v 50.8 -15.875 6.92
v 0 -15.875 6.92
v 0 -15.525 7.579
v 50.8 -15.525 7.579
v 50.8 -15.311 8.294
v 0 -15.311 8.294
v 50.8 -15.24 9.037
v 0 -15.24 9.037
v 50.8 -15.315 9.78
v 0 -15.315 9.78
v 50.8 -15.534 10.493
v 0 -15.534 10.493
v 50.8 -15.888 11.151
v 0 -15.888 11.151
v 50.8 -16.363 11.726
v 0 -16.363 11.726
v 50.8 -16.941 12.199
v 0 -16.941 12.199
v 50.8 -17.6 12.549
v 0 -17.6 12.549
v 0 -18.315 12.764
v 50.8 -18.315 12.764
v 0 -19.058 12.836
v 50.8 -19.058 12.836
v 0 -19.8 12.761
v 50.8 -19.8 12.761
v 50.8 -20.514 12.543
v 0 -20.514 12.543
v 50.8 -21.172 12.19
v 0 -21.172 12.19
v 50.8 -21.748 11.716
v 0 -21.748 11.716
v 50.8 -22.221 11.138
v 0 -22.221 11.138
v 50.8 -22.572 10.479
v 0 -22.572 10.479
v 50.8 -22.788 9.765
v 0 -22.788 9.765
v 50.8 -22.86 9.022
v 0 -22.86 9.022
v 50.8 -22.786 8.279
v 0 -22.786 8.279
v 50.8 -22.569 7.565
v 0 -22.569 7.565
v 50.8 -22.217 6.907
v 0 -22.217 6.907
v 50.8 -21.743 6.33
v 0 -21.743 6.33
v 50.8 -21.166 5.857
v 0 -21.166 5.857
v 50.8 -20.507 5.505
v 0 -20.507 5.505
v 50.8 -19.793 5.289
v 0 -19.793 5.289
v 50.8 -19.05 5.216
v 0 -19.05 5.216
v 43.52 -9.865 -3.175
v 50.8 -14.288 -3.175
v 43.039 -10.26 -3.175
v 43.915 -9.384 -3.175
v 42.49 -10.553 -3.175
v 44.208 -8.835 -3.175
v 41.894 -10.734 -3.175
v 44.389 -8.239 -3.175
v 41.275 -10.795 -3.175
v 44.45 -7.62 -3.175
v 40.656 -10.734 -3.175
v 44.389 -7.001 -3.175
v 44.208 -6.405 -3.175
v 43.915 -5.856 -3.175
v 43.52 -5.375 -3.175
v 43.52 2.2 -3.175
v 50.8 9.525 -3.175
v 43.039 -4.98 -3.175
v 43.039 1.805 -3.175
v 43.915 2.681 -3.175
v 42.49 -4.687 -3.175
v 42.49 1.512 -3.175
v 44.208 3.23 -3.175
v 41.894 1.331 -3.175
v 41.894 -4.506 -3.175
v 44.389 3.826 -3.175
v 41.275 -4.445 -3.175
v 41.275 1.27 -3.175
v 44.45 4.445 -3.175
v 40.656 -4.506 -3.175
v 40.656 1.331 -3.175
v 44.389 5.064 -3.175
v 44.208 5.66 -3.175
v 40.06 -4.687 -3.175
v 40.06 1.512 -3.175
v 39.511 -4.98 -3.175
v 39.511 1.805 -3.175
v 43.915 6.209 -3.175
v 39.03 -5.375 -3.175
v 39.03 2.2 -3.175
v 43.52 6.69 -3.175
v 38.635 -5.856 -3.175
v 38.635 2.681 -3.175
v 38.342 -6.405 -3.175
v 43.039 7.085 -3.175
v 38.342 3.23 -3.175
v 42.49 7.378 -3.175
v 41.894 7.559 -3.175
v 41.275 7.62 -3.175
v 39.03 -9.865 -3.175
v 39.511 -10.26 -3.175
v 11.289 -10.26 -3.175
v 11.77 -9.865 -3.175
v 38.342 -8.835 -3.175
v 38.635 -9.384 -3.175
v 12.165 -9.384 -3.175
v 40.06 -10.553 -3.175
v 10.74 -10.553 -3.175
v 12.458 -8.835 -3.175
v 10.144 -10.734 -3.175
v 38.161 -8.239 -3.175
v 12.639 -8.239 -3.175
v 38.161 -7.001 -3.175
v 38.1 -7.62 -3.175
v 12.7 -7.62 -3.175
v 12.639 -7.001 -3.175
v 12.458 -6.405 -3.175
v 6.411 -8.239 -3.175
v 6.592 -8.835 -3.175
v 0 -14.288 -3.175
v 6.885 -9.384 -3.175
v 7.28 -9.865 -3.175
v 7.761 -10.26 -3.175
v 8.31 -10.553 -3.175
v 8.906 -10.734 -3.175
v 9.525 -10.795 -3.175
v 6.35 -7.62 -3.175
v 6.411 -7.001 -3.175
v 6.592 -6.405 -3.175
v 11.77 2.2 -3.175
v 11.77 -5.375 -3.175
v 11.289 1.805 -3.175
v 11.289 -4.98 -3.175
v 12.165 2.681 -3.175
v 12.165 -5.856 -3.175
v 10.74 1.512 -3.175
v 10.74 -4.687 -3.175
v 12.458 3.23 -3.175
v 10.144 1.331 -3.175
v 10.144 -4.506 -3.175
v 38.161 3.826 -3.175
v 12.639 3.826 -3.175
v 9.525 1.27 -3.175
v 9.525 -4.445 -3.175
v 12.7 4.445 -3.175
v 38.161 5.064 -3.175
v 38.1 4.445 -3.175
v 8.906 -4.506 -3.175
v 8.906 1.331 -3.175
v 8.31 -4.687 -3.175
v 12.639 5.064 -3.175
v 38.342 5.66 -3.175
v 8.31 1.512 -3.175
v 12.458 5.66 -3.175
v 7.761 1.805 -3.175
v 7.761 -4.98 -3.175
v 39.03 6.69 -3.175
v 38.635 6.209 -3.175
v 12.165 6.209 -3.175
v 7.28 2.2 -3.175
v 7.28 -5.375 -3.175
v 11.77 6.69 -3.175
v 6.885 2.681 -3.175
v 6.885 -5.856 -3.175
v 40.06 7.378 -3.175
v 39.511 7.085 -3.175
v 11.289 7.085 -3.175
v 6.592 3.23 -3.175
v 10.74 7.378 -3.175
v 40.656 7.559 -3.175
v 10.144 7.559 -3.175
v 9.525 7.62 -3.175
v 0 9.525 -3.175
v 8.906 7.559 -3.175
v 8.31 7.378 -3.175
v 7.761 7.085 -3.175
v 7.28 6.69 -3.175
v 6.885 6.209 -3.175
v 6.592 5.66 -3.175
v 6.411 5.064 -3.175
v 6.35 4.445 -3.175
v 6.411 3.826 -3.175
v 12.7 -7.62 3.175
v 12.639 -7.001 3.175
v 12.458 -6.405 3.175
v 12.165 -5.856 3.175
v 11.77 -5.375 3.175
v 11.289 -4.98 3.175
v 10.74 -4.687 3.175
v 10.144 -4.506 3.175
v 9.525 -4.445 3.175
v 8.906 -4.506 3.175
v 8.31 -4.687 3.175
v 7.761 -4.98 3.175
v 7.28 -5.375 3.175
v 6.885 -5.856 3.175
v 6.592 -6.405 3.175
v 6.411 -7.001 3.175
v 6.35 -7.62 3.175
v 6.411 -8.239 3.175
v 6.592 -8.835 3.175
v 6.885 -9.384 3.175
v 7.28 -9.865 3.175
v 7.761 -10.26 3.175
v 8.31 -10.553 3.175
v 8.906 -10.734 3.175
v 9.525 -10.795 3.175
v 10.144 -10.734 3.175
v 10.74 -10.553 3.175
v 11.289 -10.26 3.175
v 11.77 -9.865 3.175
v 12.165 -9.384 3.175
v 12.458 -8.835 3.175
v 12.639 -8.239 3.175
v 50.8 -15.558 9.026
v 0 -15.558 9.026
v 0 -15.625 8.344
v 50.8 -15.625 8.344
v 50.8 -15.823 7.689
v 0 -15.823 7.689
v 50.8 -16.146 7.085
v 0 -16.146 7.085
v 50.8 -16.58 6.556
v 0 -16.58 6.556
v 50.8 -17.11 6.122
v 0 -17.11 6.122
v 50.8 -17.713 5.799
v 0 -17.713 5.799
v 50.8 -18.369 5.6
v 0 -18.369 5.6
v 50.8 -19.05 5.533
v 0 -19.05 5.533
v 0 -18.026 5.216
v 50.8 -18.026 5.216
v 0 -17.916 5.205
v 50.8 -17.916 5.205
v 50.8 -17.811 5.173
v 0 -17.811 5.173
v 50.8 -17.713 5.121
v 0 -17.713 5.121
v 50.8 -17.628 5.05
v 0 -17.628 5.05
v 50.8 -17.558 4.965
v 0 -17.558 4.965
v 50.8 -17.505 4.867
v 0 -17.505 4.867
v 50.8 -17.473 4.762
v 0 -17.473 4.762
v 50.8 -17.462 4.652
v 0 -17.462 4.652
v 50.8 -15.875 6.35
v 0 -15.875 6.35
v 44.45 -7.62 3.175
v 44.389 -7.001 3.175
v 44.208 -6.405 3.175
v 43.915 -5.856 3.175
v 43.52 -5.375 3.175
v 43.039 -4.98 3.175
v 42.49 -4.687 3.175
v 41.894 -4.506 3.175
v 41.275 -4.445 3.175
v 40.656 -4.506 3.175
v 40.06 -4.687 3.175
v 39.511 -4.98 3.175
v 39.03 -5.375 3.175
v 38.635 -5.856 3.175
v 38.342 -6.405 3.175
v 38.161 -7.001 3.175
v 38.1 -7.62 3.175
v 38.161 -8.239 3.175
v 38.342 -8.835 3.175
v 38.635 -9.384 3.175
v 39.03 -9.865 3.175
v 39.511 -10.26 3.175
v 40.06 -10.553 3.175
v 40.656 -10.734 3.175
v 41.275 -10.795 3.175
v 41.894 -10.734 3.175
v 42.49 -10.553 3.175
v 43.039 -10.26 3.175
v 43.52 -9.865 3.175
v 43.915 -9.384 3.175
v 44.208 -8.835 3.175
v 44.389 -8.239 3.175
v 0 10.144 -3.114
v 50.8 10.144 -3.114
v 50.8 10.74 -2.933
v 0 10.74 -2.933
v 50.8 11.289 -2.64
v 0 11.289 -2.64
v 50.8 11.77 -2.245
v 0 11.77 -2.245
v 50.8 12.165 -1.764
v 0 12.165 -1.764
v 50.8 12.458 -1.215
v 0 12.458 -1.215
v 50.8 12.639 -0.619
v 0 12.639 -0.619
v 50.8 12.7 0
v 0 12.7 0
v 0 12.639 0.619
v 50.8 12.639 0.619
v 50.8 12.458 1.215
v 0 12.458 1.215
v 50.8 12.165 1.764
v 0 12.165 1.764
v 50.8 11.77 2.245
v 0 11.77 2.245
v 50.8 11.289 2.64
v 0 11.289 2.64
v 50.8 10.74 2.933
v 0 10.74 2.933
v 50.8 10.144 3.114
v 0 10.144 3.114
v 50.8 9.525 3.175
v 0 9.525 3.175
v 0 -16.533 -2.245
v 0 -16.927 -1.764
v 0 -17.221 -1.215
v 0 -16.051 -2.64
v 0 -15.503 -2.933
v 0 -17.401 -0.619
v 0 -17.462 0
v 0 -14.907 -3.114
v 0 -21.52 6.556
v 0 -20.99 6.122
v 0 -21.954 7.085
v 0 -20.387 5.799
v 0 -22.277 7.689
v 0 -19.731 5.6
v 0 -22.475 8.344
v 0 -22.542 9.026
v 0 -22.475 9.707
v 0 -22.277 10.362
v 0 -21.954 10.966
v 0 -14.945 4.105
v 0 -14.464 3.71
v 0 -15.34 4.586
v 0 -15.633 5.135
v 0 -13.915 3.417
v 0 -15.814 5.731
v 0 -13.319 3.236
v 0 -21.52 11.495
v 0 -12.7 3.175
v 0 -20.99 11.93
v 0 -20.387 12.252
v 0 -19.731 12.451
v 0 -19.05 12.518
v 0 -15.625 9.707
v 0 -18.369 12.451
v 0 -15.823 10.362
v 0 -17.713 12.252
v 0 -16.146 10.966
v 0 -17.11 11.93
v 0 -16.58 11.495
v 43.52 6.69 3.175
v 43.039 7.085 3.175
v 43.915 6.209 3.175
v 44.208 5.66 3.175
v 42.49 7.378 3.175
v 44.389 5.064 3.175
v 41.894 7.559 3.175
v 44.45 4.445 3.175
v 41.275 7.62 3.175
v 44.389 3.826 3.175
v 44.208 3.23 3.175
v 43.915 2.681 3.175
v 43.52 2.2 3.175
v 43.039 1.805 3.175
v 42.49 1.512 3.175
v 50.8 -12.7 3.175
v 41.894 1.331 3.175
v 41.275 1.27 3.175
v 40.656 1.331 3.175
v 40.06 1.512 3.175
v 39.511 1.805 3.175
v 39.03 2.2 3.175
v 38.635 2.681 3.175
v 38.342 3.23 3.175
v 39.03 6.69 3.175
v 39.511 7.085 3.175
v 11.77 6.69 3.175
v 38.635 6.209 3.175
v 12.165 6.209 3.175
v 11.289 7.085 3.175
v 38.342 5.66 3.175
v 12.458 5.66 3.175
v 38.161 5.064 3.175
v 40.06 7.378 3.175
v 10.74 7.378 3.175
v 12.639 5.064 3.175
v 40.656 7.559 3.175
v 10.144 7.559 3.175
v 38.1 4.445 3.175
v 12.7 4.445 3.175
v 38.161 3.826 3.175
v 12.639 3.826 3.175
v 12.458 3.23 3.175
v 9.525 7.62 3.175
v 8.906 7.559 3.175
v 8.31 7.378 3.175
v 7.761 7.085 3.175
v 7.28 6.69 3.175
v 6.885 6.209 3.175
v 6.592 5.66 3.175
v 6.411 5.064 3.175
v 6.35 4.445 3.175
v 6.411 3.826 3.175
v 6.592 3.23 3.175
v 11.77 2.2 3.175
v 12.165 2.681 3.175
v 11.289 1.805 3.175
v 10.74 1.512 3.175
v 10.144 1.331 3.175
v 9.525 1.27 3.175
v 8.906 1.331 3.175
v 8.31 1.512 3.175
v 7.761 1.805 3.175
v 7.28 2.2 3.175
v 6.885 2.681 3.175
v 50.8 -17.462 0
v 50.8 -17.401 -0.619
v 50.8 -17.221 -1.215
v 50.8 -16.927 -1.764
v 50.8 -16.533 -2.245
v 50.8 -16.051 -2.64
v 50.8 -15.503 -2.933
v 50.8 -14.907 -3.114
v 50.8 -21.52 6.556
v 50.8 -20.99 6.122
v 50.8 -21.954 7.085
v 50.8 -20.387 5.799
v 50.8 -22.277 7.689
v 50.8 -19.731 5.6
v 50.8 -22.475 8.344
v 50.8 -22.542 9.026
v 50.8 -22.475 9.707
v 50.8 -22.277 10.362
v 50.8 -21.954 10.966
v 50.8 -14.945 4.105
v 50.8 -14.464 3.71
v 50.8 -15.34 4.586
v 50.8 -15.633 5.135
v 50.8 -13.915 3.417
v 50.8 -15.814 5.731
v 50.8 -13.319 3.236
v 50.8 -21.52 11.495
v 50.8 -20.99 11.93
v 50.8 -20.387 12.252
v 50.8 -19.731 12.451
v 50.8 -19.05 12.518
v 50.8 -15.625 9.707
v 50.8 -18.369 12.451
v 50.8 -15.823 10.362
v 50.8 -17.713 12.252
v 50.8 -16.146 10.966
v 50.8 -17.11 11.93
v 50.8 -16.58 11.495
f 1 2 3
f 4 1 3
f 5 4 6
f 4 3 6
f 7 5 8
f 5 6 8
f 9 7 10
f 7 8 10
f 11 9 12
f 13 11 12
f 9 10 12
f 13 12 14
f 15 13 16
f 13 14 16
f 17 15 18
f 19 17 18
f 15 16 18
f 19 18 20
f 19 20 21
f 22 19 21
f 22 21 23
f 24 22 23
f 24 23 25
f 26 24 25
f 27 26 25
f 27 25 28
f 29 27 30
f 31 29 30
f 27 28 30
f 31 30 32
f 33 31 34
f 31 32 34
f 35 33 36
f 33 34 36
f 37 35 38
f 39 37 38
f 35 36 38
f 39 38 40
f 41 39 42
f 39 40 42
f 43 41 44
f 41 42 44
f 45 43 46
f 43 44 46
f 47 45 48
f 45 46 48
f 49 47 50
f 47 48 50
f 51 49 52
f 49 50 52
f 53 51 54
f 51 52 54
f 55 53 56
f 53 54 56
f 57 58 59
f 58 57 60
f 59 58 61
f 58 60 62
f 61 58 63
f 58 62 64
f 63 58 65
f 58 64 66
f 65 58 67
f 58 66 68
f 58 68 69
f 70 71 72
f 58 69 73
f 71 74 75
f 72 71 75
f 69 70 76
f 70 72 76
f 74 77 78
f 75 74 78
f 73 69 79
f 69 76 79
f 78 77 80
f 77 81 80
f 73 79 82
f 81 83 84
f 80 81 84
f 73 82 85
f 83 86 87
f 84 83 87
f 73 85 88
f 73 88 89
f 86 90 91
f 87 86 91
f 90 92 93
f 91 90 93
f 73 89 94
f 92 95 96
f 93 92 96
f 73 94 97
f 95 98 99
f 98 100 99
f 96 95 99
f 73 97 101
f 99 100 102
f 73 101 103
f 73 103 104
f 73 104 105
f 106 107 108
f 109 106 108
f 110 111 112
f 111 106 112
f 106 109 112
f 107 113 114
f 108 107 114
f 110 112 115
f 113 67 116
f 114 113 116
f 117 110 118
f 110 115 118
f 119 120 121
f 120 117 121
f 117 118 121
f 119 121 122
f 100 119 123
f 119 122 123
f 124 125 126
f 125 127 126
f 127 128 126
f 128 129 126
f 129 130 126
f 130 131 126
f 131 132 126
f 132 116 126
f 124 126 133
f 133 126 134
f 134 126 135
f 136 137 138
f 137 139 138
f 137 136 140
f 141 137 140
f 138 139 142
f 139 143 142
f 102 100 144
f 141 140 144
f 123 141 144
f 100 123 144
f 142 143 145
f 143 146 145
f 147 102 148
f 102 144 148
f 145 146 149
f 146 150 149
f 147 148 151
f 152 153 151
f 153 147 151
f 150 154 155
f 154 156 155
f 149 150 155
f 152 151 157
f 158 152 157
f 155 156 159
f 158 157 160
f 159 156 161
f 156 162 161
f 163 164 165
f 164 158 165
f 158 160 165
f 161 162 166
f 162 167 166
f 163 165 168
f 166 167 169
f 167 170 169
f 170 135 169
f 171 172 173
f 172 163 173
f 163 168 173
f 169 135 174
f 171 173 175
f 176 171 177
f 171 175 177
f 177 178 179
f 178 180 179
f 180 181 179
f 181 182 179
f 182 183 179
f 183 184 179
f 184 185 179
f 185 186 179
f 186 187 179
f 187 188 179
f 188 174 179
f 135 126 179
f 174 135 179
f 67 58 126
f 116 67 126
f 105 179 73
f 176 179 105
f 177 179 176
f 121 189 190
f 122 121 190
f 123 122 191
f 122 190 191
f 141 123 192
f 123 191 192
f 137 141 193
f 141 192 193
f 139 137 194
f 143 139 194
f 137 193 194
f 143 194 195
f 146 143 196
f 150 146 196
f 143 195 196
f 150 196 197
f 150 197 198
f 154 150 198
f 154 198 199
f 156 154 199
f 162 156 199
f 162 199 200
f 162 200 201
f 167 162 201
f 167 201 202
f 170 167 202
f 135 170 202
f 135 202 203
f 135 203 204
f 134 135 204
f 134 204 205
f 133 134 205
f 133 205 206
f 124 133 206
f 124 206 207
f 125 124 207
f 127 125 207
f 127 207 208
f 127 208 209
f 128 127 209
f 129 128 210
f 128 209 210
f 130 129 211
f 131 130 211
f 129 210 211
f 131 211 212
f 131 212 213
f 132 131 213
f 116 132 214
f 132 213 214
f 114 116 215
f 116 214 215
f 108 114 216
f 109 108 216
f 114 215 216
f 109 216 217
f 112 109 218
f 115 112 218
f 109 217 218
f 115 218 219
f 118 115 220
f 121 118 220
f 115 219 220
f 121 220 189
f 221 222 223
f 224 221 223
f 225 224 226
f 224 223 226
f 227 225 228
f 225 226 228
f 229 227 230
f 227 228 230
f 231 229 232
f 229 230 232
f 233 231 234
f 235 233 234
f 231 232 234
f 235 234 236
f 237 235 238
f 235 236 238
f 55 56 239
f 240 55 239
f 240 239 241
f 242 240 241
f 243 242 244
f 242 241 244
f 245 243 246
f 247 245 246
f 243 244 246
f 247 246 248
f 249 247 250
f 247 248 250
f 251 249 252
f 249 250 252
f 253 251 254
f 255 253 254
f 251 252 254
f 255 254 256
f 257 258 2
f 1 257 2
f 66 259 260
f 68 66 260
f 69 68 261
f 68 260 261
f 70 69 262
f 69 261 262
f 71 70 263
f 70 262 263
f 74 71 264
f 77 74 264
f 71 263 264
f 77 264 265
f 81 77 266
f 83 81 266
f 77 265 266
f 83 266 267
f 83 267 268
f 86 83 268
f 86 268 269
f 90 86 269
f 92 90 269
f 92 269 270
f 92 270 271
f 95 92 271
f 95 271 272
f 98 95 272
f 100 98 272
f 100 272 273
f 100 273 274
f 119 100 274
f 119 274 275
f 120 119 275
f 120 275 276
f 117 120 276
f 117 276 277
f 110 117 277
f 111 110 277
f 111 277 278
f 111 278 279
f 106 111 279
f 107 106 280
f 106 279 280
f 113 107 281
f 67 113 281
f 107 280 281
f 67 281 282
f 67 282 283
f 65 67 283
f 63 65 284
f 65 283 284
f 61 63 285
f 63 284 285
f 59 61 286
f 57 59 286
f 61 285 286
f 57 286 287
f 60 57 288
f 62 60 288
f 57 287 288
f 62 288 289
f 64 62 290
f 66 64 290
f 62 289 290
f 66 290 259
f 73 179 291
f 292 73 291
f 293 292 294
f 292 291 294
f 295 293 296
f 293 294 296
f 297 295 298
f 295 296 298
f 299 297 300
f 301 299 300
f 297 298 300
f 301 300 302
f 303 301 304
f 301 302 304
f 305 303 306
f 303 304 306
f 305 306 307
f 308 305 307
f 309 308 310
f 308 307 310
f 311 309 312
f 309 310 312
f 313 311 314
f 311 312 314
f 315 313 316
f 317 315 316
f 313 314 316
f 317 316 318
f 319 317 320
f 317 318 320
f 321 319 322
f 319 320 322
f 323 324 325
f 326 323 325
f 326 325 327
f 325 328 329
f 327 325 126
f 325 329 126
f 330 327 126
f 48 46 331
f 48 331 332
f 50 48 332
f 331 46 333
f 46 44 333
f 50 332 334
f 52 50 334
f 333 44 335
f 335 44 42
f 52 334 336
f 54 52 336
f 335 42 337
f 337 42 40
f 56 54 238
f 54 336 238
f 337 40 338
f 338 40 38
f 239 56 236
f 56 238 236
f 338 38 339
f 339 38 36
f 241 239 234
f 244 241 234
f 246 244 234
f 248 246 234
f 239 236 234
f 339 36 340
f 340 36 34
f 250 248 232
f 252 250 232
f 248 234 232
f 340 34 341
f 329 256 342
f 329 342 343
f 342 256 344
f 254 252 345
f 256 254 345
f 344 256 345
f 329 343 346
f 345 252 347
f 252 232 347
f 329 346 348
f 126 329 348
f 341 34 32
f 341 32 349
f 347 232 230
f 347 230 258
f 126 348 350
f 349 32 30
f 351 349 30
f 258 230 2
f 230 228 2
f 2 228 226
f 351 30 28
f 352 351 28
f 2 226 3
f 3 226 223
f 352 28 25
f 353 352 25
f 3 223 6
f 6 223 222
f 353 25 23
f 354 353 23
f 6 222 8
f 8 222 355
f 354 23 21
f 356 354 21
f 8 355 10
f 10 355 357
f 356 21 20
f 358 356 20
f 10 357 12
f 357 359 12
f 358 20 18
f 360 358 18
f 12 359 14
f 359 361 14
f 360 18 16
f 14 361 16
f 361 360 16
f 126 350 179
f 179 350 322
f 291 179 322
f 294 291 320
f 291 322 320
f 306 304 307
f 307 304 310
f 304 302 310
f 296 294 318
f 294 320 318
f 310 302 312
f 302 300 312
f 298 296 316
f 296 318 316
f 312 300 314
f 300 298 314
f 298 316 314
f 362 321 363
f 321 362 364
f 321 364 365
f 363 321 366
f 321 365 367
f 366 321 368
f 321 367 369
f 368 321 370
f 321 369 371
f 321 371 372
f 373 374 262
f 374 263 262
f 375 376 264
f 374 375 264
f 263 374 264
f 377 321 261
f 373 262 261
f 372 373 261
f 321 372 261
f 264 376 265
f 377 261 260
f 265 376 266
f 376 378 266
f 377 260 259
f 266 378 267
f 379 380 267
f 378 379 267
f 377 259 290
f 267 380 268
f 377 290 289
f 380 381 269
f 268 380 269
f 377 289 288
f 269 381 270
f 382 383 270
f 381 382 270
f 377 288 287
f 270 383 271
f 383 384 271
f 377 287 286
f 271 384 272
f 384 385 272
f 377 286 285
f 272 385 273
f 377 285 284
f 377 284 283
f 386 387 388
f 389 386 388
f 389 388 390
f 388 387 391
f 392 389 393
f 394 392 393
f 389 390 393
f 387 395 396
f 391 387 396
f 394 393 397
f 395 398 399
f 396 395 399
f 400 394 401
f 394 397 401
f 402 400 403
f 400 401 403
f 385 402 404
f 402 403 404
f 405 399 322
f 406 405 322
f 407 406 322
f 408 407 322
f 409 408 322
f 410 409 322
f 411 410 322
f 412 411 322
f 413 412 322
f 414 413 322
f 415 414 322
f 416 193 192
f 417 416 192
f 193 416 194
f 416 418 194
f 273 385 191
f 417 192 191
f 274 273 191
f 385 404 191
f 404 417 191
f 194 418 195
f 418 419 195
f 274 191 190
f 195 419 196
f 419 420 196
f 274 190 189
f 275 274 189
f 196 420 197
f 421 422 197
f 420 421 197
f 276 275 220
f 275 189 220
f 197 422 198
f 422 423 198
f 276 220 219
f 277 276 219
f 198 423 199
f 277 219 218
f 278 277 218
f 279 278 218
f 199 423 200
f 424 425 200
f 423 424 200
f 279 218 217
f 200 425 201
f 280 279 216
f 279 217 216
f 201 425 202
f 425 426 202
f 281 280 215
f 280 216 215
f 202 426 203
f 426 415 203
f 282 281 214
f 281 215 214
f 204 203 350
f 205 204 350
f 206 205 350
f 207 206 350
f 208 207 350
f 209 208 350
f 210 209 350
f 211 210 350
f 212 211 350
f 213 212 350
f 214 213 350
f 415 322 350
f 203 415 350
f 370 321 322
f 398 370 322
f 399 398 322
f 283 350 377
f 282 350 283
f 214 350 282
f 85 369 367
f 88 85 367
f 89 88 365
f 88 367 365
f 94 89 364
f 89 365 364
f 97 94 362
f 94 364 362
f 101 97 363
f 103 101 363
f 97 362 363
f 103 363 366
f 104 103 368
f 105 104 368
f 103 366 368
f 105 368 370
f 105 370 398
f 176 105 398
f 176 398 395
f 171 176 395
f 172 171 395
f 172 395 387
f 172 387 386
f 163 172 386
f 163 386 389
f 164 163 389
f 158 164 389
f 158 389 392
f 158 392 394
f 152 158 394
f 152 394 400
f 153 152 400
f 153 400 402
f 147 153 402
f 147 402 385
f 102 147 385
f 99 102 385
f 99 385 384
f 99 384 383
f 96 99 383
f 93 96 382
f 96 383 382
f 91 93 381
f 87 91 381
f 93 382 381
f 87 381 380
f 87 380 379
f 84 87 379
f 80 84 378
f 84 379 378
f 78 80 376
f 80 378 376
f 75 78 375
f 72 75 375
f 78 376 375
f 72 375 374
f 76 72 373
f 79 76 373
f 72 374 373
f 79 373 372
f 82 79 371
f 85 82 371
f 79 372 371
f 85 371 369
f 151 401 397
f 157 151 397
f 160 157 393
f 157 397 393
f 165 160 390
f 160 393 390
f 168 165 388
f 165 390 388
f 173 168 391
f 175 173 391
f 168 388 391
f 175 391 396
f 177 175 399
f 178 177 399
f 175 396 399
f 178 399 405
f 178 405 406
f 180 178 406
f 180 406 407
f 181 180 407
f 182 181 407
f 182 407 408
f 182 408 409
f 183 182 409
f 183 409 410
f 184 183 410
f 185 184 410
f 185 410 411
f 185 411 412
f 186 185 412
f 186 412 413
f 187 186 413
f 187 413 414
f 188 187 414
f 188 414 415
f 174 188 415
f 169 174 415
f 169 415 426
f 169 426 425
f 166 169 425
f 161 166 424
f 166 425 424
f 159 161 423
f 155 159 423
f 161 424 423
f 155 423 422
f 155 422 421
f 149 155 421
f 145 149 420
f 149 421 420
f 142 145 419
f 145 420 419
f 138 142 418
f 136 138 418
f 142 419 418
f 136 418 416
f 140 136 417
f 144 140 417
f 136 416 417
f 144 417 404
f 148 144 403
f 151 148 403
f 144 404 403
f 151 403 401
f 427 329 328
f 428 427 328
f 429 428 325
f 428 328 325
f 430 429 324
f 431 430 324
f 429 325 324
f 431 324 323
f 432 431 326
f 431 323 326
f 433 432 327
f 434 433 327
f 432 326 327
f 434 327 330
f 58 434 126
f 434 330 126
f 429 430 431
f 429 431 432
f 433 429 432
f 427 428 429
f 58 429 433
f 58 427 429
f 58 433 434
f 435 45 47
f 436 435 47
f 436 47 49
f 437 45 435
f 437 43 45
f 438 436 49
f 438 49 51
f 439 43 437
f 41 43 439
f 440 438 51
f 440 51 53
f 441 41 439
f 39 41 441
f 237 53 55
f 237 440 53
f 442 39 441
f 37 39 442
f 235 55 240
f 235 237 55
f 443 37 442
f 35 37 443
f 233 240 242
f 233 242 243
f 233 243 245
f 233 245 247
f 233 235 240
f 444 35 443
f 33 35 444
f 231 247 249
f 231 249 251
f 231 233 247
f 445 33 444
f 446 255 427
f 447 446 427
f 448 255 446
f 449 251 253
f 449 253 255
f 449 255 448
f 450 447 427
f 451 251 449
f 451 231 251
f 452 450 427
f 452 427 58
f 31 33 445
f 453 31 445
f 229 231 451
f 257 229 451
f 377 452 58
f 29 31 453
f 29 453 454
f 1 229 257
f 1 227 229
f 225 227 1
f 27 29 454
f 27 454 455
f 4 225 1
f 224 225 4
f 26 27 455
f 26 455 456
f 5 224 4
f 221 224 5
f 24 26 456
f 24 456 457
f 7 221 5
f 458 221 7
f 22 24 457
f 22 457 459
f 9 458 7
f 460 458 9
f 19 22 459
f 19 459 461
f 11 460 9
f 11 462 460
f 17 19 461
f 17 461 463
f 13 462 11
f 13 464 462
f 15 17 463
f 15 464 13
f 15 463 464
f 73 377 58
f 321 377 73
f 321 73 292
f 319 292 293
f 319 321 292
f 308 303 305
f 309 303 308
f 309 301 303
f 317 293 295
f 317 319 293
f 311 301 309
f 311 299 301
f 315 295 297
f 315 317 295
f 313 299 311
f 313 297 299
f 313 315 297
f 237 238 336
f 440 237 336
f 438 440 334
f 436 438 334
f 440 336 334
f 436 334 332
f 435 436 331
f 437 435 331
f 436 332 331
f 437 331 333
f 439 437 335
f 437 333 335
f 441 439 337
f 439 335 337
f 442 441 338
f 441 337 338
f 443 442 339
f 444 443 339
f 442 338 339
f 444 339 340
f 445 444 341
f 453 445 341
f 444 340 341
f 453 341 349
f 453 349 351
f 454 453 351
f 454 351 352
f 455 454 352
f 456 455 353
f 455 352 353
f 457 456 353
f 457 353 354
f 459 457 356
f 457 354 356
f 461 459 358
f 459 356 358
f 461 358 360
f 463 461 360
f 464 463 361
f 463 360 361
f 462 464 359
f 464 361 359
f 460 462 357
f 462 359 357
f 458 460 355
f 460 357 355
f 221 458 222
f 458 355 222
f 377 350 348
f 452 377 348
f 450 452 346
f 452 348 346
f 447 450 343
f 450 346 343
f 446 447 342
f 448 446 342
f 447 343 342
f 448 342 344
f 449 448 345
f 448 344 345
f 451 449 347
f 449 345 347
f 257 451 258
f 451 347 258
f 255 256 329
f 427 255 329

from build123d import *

# Parameters (mm, degrees)
F1_DEPTH = 50.8
F2_R     = 3.175
F3_DEPTH = 25.4


with BuildPart() as f1:
    # F0 (on Right) → F1 (new body)
    with BuildSketch(Plane.YZ):
        with BuildLine():
            ThreePointArc((12.7, 0), (11.770064, 2.245064), (9.525, 3.175))
            Line((9.525, 3.175), (-12.7, 3.175))
            ThreePointArc((-12.7, 3.175), (-14.945064, 4.104936), (-15.875, 6.35))
            Line((-15.875, 6.35), (-15.875, 6.919573))
            ThreePointArc((-15.875, 6.919573), (-20.851669, 12.382725), (-19.05, 5.21563))
            Line((-19.05, 5.21563), (-18.026482, 5.21563))
            ThreePointArc((-18.026482, 5.21563), (-17.627686, 5.050443), (-17.4625, 4.651648))
            Line((-17.4625, 4.651648), (-17.4625, 0))
            ThreePointArc((-17.4625, 0), (-16.532564, -2.245064), (-14.2875, -3.175))
            Line((-14.2875, -3.175), (-12.7, -3.175))
            Line((-12.7, -3.175), (9.525, -3.175))
            ThreePointArc((9.525, -3.175), (11.770064, -2.245064), (12.7, 0))
        make_face()
        with BuildLine():
            ThreePointArc((-15.5575, 9.02563), (-16.58043, 6.556059), (-19.05, 5.53313))
            ThreePointArc((-19.05, 5.53313), (-21.51957, 11.4952), (-15.5575, 9.02563))
        make_face(mode=Mode.SUBTRACT)
    extrude(amount=F1_DEPTH)

    # F2 (on face) → F3 (cut)
    with BuildSketch(Plane.XY.offset(3.175)):
        with Locations((41.275, -7.62)):
            Circle(F2_R)
        with Locations((41.275, 4.445)):
            Circle(F2_R)
        with Locations((9.525, 4.445)):
            Circle(F2_R)
        with Locations((9.525, -7.62)):
            Circle(F2_R)
    extrude(amount=-F3_DEPTH, mode=Mode.SUBTRACT)


solid = f1.part
